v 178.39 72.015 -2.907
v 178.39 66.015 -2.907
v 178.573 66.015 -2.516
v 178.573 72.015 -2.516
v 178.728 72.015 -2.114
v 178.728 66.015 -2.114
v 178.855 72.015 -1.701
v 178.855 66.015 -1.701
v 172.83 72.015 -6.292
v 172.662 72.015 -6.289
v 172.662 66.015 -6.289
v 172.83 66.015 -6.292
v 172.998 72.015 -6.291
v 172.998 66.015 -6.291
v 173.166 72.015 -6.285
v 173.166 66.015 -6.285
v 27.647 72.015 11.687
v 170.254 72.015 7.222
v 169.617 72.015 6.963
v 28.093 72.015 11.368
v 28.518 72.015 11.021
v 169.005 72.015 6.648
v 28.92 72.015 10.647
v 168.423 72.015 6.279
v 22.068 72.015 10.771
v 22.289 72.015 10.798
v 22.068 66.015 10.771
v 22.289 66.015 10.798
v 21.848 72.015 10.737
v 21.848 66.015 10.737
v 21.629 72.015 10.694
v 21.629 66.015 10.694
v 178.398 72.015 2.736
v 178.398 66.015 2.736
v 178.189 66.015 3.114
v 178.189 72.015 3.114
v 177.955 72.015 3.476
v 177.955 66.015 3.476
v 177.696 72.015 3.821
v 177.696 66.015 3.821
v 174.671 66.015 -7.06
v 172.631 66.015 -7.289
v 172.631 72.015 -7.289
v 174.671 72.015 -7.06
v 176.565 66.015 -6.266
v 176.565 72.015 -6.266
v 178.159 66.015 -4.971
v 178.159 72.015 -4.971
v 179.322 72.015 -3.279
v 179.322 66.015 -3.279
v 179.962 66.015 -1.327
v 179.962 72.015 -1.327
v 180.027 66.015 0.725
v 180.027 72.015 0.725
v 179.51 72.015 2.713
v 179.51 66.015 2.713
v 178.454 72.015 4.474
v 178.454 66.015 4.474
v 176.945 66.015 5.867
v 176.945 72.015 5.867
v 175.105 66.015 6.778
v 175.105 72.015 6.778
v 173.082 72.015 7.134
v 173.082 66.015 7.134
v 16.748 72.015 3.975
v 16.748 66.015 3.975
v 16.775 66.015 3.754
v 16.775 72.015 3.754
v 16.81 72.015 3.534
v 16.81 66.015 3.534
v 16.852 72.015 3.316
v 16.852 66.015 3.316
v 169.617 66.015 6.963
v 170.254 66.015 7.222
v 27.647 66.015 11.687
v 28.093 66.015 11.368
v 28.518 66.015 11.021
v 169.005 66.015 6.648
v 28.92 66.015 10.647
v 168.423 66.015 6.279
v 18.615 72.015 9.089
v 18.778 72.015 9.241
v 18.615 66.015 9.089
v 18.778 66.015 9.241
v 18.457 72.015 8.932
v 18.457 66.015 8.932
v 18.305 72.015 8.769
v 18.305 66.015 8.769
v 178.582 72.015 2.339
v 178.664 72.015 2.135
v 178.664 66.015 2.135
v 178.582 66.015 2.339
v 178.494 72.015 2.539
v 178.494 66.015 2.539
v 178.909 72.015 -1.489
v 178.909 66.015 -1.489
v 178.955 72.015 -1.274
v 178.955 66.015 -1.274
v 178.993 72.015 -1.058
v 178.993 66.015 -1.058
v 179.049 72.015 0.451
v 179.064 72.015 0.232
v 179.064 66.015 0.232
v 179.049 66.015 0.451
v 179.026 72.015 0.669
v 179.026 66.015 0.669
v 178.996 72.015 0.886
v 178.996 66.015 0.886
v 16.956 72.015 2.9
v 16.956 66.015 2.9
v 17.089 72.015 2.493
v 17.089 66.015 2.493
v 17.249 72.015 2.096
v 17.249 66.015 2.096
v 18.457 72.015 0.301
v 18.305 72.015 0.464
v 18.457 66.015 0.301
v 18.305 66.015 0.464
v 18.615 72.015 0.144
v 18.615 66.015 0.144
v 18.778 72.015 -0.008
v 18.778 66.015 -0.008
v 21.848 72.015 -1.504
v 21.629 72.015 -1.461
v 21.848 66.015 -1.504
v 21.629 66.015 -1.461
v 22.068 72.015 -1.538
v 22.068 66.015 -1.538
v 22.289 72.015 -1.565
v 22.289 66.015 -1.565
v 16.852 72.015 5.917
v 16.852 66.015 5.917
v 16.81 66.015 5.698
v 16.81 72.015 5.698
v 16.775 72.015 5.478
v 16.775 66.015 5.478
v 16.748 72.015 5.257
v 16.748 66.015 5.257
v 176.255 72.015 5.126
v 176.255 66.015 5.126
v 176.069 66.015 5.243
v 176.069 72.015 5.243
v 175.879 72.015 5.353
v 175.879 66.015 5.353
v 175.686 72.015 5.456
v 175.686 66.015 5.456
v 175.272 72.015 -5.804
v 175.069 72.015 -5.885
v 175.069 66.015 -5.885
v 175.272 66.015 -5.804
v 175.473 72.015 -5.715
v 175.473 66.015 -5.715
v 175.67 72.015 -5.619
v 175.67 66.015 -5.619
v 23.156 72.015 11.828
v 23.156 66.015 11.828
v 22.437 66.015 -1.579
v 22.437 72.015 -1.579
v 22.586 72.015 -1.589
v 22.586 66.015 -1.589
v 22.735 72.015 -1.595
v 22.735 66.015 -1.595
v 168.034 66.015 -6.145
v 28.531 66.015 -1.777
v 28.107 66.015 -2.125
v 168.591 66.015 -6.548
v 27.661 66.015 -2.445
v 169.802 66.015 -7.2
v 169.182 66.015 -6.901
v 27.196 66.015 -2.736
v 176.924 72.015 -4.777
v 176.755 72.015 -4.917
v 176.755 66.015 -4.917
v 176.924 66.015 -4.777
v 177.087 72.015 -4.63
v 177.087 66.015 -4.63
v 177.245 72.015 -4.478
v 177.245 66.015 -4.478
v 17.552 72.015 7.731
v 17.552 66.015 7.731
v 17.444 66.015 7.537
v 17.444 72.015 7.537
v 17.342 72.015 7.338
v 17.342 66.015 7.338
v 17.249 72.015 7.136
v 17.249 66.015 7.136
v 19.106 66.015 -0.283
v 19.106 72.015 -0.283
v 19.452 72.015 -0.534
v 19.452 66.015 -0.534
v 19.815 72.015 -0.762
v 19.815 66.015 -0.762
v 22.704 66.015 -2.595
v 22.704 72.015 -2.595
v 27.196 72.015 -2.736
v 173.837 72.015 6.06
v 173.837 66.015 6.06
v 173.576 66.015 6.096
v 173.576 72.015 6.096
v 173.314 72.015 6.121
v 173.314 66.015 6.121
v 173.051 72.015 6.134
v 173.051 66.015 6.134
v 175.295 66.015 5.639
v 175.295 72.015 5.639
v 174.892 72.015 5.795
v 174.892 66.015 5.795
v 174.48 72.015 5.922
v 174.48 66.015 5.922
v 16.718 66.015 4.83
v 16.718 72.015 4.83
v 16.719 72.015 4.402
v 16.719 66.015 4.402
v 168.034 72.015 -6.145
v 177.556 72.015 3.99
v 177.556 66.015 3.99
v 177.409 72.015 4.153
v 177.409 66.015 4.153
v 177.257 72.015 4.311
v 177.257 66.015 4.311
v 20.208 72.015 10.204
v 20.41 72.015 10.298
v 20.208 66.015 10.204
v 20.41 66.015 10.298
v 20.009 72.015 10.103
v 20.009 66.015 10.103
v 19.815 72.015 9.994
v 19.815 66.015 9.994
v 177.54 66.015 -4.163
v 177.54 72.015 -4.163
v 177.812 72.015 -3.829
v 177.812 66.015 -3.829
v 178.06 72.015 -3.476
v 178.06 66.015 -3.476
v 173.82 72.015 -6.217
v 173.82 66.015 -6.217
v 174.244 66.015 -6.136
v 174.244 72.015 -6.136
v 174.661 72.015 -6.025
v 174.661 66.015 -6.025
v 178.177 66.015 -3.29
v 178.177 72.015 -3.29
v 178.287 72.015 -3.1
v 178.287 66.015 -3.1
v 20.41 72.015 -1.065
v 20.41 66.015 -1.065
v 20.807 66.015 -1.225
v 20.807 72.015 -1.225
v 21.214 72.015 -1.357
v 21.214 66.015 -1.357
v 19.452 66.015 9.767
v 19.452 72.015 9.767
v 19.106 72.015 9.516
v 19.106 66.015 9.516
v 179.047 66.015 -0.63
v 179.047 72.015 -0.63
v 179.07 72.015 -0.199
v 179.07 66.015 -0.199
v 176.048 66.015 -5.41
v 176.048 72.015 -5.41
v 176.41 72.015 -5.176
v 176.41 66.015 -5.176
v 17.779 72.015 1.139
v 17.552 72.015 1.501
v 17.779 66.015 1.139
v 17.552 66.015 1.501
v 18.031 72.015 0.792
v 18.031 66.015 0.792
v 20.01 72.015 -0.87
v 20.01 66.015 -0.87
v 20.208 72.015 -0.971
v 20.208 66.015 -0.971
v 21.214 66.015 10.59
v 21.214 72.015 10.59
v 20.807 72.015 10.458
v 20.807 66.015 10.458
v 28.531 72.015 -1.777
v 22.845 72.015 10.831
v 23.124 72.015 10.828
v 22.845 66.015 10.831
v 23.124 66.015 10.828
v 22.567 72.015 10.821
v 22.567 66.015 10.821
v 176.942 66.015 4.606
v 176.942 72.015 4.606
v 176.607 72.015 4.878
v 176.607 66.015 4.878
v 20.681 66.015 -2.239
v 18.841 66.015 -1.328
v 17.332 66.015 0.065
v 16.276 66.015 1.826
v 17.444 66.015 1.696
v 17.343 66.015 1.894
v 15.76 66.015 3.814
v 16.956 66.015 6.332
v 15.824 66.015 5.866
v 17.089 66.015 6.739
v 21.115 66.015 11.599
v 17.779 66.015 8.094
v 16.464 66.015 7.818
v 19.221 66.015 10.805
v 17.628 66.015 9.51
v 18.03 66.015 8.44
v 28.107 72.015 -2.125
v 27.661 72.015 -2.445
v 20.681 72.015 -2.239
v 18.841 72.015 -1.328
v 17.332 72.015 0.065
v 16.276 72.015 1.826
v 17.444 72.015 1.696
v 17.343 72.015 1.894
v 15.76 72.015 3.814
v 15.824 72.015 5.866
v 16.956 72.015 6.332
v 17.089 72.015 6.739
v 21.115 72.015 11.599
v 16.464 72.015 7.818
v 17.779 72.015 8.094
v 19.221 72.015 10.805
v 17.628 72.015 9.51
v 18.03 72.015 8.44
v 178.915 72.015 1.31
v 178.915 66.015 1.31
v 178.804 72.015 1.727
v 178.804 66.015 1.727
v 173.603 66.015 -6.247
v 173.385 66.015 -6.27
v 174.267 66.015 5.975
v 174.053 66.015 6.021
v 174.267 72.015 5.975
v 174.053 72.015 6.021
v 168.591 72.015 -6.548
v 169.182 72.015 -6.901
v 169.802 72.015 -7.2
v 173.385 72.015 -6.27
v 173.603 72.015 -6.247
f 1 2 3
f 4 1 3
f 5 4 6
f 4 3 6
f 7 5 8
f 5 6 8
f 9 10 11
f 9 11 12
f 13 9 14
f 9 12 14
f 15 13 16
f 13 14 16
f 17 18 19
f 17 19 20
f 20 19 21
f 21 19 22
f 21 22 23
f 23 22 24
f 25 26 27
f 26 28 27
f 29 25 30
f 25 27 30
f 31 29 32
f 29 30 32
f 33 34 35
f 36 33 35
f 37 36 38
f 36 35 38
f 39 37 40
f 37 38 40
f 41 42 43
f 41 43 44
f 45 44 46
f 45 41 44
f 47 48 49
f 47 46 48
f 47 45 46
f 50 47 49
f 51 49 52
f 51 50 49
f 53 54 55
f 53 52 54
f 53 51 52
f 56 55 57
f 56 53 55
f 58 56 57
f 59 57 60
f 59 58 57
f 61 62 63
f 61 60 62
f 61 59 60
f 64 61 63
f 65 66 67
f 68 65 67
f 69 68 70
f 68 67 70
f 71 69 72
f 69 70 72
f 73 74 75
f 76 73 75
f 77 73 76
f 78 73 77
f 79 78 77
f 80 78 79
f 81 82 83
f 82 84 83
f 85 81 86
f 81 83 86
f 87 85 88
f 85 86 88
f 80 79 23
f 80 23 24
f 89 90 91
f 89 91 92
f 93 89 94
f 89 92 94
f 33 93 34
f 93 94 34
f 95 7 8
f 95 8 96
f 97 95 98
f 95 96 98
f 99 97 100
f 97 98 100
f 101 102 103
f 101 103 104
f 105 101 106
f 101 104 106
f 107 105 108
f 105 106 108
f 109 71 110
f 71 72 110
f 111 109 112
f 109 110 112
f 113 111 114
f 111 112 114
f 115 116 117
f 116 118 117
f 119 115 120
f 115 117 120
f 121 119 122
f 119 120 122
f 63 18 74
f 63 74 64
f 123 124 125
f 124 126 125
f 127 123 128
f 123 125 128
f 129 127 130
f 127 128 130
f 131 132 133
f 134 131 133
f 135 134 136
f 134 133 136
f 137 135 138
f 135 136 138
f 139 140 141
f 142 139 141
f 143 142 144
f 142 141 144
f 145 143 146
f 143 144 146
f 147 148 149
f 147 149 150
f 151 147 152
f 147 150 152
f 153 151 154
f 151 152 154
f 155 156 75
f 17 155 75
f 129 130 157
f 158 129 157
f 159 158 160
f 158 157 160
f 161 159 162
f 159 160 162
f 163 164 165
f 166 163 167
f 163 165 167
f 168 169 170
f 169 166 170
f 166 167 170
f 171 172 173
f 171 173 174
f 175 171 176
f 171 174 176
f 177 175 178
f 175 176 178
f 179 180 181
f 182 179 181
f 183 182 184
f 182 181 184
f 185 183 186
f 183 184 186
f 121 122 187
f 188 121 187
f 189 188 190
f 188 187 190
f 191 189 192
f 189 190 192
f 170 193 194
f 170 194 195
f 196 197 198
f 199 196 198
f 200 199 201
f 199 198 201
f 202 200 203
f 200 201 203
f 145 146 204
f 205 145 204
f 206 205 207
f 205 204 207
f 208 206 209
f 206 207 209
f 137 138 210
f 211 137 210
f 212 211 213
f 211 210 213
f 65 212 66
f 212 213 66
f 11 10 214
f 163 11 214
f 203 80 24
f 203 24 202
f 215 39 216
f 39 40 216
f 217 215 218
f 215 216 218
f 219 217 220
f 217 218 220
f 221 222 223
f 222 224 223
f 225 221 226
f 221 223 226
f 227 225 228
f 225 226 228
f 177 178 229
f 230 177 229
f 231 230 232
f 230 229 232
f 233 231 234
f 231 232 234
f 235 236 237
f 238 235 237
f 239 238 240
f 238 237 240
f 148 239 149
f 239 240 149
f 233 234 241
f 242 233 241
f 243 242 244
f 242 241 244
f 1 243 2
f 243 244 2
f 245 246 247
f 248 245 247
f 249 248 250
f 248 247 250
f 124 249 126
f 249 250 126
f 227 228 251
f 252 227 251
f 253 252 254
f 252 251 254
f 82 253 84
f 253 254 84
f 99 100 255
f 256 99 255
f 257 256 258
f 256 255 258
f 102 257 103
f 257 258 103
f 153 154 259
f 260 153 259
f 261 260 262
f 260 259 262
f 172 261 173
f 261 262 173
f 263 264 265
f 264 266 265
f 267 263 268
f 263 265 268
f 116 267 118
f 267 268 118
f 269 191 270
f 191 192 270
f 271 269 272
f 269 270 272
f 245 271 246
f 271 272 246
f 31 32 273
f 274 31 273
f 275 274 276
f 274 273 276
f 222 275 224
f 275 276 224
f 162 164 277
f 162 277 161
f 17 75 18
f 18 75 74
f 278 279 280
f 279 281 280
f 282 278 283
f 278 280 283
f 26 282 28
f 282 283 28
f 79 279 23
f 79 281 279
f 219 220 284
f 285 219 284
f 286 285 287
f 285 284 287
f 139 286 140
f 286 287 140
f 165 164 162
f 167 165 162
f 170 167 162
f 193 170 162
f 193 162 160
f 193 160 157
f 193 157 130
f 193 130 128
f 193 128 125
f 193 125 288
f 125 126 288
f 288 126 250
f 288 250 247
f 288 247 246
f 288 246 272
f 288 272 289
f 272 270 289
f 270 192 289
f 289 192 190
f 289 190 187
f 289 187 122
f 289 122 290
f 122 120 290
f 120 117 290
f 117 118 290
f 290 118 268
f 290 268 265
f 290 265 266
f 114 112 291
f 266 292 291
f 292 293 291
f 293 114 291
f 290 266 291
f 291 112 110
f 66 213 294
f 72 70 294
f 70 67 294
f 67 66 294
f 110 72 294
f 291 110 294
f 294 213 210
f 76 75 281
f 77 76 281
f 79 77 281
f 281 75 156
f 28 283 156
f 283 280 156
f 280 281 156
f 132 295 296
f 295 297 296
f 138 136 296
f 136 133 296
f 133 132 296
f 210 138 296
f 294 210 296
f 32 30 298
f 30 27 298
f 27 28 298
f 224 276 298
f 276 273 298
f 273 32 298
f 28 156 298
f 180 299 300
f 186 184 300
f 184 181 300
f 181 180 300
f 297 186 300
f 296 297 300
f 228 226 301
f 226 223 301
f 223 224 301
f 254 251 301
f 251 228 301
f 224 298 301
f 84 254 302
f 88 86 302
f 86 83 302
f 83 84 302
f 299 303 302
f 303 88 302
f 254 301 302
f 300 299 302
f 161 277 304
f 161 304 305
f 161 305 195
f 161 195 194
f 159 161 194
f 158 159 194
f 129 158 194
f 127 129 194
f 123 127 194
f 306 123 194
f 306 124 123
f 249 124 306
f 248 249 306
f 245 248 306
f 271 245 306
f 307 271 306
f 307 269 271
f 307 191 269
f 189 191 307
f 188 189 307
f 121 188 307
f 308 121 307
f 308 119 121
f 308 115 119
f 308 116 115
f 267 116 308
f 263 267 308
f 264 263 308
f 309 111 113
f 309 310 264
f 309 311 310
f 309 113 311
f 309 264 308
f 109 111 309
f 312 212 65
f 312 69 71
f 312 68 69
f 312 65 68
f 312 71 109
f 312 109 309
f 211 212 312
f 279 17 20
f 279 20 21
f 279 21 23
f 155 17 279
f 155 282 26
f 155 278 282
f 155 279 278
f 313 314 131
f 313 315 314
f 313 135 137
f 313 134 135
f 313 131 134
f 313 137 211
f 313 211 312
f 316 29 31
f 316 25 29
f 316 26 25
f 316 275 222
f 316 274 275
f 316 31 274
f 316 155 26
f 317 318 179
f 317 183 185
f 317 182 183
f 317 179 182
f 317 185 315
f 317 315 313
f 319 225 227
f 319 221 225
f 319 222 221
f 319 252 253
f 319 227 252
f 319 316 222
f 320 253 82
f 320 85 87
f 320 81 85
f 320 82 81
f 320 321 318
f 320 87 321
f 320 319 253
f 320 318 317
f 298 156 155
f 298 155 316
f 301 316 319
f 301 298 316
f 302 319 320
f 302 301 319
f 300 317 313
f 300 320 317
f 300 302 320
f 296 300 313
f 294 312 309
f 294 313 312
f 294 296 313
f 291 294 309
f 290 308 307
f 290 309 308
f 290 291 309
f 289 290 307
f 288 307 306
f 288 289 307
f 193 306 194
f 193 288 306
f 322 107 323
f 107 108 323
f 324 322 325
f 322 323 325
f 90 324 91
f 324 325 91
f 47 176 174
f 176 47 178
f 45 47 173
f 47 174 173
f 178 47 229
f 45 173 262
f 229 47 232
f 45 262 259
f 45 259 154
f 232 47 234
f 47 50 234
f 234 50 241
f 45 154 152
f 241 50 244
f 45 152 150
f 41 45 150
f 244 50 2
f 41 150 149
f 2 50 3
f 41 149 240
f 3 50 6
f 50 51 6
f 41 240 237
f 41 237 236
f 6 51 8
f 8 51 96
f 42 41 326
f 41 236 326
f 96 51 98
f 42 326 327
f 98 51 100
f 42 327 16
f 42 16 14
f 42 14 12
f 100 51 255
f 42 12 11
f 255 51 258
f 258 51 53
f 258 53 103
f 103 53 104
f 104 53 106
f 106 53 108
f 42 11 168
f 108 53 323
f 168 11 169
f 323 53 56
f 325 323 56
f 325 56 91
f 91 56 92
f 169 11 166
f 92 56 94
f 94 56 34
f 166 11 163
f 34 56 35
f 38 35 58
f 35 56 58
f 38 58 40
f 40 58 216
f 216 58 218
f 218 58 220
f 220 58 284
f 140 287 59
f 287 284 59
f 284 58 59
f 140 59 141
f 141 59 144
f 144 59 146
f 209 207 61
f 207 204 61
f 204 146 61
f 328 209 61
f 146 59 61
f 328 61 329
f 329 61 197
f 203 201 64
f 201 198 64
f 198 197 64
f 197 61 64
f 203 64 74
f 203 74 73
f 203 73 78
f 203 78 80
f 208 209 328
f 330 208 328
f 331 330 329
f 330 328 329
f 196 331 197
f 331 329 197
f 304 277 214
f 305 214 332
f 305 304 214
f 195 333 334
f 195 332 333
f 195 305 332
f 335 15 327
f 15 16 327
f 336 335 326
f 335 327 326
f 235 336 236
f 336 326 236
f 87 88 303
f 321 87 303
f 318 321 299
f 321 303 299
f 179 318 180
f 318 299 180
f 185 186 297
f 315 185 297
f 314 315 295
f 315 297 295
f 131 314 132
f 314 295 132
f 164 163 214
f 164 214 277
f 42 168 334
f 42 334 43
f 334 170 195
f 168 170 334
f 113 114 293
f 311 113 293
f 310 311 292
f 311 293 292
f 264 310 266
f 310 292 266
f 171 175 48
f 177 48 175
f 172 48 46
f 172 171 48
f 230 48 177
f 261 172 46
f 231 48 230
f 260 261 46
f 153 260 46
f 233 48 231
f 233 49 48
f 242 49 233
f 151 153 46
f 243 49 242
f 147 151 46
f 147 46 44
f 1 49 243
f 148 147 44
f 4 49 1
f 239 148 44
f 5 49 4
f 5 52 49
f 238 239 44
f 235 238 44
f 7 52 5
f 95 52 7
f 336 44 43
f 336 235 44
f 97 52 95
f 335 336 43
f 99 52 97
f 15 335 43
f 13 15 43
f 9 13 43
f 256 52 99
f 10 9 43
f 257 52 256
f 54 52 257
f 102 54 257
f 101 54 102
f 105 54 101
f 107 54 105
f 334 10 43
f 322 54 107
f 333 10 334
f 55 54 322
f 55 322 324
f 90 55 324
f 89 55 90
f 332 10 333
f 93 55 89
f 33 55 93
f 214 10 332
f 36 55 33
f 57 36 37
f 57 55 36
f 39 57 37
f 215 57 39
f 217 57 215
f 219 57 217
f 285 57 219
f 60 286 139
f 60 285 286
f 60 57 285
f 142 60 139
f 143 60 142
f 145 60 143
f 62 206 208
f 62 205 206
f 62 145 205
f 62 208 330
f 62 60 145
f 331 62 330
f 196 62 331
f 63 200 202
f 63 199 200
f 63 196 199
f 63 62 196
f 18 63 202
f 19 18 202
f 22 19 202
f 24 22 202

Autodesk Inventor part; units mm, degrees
ref_plane "YZ Plane" through (0, 0, 0) normal (1, 0, 0) x (0, 1, 0)
ref_plane "XZ Plane" through (0, 0, 0) normal (0, 1, 0) x (-1, 0, 0)
ref_plane "Work Plane1" through (99.0561, 66.015, -1.0424) normal (0, 1, 0) x (-0.9985, 0, 0.0543)
sketch "Sketch1" plane through (99.0561, 66.015, -1.0424) normal (0, 1, 0) x (-0.9985, 0, 0.0543)
  circle A0 centre (-73.639, 4.9709) radius 7.75 projected
  arc A1 (-74.285, 11.1523) -> (-74.9346, 11.0494) centre (-73.639, 4.9709) ccw projected
  line L0 (-74.039, 10.5582) -> (-74.285, 11.1523) projected
  line L1 (-73.239, 10.5582) -> (-74.039, 10.5582) projected
  line L2 (-72.9929, 11.1523) -> (-73.239, 10.5582) projected
  arc A2 (-72.3433, 11.0494) -> (-72.9929, 11.1523) centre (-73.639, 4.9709) ccw projected
  line L3 (-72.2928, 10.4083) -> (-72.3433, 11.0494) projected
  line L4 (-71.532, 10.1611) -> (-72.2928, 10.4083) projected
  line L5 (-71.1144, 10.6501) -> (-71.532, 10.1611) projected
  arc A3 (-70.5284, 10.3515) -> (-71.1144, 10.6501) centre (-73.639, 4.9709) ccw projected
  line L6 (-70.6785, 9.7262) -> (-70.5284, 10.3515) projected
  line L7 (-70.0313, 9.256) -> (-70.6785, 9.7262) projected
  line L8 (-69.483, 9.592) -> (-70.0313, 9.256) projected
  arc A4 (-69.0179, 9.1269) -> (-69.483, 9.592) centre (-73.639, 4.9709) ccw projected
  line L9 (-69.3539, 8.5786) -> (-69.0179, 9.1269) projected
  line L10 (-68.8837, 7.9314) -> (-69.3539, 8.5786) projected
  line L11 (-68.2584, 8.0815) -> (-68.8837, 7.9314) projected
  arc A5 (-67.9598, 7.4955) -> (-68.2584, 8.0815) centre (-73.639, 4.9709) ccw projected
  line L12 (-68.4488, 7.0779) -> (-67.9598, 7.4955) projected
  line L13 (-68.2016, 6.3171) -> (-68.4488, 7.0779) projected
  line L14 (-67.5605, 6.2666) -> (-68.2016, 6.3171) projected
  arc A6 (-67.4576, 5.617) -> (-67.5605, 6.2666) centre (-73.639, 4.9709) ccw projected
  line L15 (-68.0517, 5.3709) -> (-67.4576, 5.617) projected
  line L16 (-68.0517, 4.5709) -> (-68.0517, 5.3709) projected
  line L17 (-67.4576, 4.3249) -> (-68.0517, 4.5709) projected
  arc A7 (-67.5605, 3.6753) -> (-67.4576, 4.3249) centre (-73.639, 4.9709) ccw projected
  line L18 (-68.2016, 3.6248) -> (-67.5605, 3.6753) projected
  line L19 (-68.4488, 2.864) -> (-68.2016, 3.6248) projected
  line L20 (-67.9598, 2.4463) -> (-68.4488, 2.864) projected
  arc A8 (-68.2584, 1.8603) -> (-67.9598, 2.4463) centre (-73.639, 4.9709) ccw projected
  line L21 (-68.8837, 2.0105) -> (-68.2584, 1.8603) projected
  line L22 (-69.3539, 1.3632) -> (-68.8837, 2.0105) projected
  line L23 (-69.0179, 0.815) -> (-69.3539, 1.3632) projected
  arc A9 (-69.483, 0.3499) -> (-69.0179, 0.815) centre (-73.639, 4.9709) ccw projected
  line L24 (-70.0313, 0.6859) -> (-69.483, 0.3499) projected
  line L25 (-70.6785, 0.2157) -> (-70.0313, 0.6859) projected
  line L26 (-70.5284, -0.4096) -> (-70.6785, 0.2157) projected
  arc A10 (-71.1144, -0.7082) -> (-70.5284, -0.4096) centre (-73.639, 4.9709) ccw projected
  line L27 (-71.532, -0.2192) -> (-71.1144, -0.7082) projected
  line L28 (-72.2928, -0.4664) -> (-71.532, -0.2192) projected
  line L29 (-72.3433, -1.1075) -> (-72.2928, -0.4664) projected
  arc A11 (-72.9929, -1.2104) -> (-72.3433, -1.1075) centre (-73.639, 4.9709) ccw projected
  line L30 (-73.239, -0.6163) -> (-72.9929, -1.2104) projected
  line L31 (-74.039, -0.6163) -> (-73.239, -0.6163) projected
  line L32 (-74.285, -1.2104) -> (-74.039, -0.6163) projected
  arc A12 (-74.9346, -1.1075) -> (-74.285, -1.2104) centre (-73.639, 4.9709) ccw projected
  line L33 (-74.9851, -0.4664) -> (-74.9346, -1.1075) projected
  line L34 (-75.7459, -0.2192) -> (-74.9851, -0.4664) projected
  line L35 (-76.1636, -0.7082) -> (-75.7459, -0.2192) projected
  arc A13 (-76.7496, -0.4096) -> (-76.1636, -0.7082) centre (-73.639, 4.9709) ccw projected
  line L36 (-76.5994, 0.2157) -> (-76.7496, -0.4096) projected
  line L37 (-77.2467, 0.6859) -> (-76.5994, 0.2157) projected
  line L38 (-77.7949, 0.3499) -> (-77.2467, 0.6859) projected
  arc A14 (-78.26, 0.815) -> (-77.7949, 0.3499) centre (-73.639, 4.9709) ccw projected
  line L39 (-77.924, 1.3632) -> (-78.26, 0.815) projected
  line L40 (-78.3942, 2.0105) -> (-77.924, 1.3632) projected
  line L41 (-79.0195, 1.8603) -> (-78.3942, 2.0105) projected
  arc A15 (-79.3181, 2.4463) -> (-79.0195, 1.8603) centre (-73.639, 4.9709) ccw projected
  line L42 (-78.8291, 2.864) -> (-79.3181, 2.4463) projected
  line L43 (-79.0763, 3.6248) -> (-78.8291, 2.864) projected
  line L44 (-79.7174, 3.6753) -> (-79.0763, 3.6248) projected
  arc A16 (-79.8203, 4.3249) -> (-79.7174, 3.6753) centre (-73.639, 4.9709) ccw projected
  line L45 (-79.2262, 4.5709) -> (-79.8203, 4.3249) projected
  line L46 (-79.2262, 5.3709) -> (-79.2262, 4.5709) projected
  line L47 (-79.8203, 5.617) -> (-79.2262, 5.3709) projected
  arc A17 (-79.7174, 6.2666) -> (-79.8203, 5.617) centre (-73.639, 4.9709) ccw projected
  line L48 (-79.0763, 6.3171) -> (-79.7174, 6.2666) projected
  line L49 (-78.8291, 7.0779) -> (-79.0763, 6.3171) projected
  line L50 (-79.3181, 7.4955) -> (-78.8291, 7.0779) projected
  arc A18 (-79.0195, 8.0815) -> (-79.3181, 7.4955) centre (-73.639, 4.9709) ccw projected
  line L51 (-78.3942, 7.9314) -> (-79.0195, 8.0815) projected
  line L52 (-77.924, 8.5786) -> (-78.3942, 7.9314) projected
  line L53 (-78.26, 9.1269) -> (-77.924, 8.5786) projected
  arc A19 (-77.7949, 9.592) -> (-78.26, 9.1269) centre (-73.639, 4.9709) ccw projected
  line L54 (-77.2467, 9.256) -> (-77.7949, 9.592) projected
  line L55 (-76.5994, 9.7262) -> (-77.2467, 9.256) projected
  line L56 (-76.7496, 10.3515) -> (-76.5994, 9.7262) projected
  arc A20 (-76.1636, 10.6501) -> (-76.7496, 10.3515) centre (-73.639, 4.9709) ccw projected
  line L57 (-75.7459, 10.1611) -> (-76.1636, 10.6501) projected
  line L58 (-74.9851, 10.4083) -> (-75.7459, 10.1611) projected
  line L59 (-74.9346, 11.0494) -> (-74.9851, 10.4083) projected
  circle A21 centre (76.3213, 1.5167) radius 8.5 projected
  arc A22 (76.017, 7.7243) -> (75.3526, 7.6558) centre (76.3213, 1.5167) ccw projected
  line L60 (76.226, 7.1302) -> (76.017, 7.7243) projected
  line L61 (77.0249, 7.0867) -> (76.226, 7.1302) projected
  line L62 (77.2971, 7.6546) -> (77.0249, 7.0867) projected
  arc A23 (77.9501, 7.5145) -> (77.2971, 7.6546) centre (76.3213, 1.5167) ccw projected
  line L63 (77.9654, 6.8849) -> (77.9501, 7.5145) projected
  line L64 (78.7116, 6.5967) -> (77.9654, 6.8849) projected
  line L65 (79.1461, 7.0527) -> (78.7116, 6.5967) projected
  arc A24 (79.7238, 6.7176) -> (79.1461, 7.0527) centre (76.3213, 1.5167) ccw projected
  line L66 (79.5437, 6.1141) -> (79.7238, 6.7176) projected
  line L67 (80.1645, 5.6094) -> (79.5437, 6.1141) projected
  line L68 (80.7185, 5.9088) -> (80.1645, 5.6094) projected
  arc A25 (81.1644, 5.4116) -> (80.7185, 5.9088) centre (76.3213, 1.5167) ccw projected
  line L69 (80.8067, 4.8933) -> (81.1644, 5.4116) projected
  line L70 (81.2411, 4.2215) -> (80.8067, 4.8933) projected
  line L71 (81.8605, 4.335) -> (81.2411, 4.2215) projected
  arc A26 (82.131, 3.7243) -> (81.8605, 4.335) centre (76.3213, 1.5167) ccw projected
  line L72 (81.6306, 3.3419) -> (82.131, 3.7243) projected
  line L73 (81.8361, 2.5688) -> (81.6306, 3.3419) projected
  line L74 (82.4603, 2.4853) -> (81.8361, 2.5688) projected
  arc A27 (82.5288, 1.821) -> (82.4603, 2.4853) centre (76.3213, 1.5167) ccw projected
  line L75 (81.9347, 1.6119) -> (82.5288, 1.821) projected
  line L76 (81.8913, 0.8131) -> (81.9347, 1.6119) projected
  line L77 (82.4592, 0.5409) -> (81.8913, 0.8131) projected
  arc A28 (82.319, -0.1121) -> (82.4592, 0.5409) centre (76.3213, 1.5167) ccw projected
  line L78 (81.6894, -0.1274) -> (82.319, -0.1121) projected
  line L79 (81.4012, -0.8737) -> (81.6894, -0.1274) projected
  line L80 (81.8572, -1.3081) -> (81.4012, -0.8737) projected
  arc A29 (81.5221, -1.8858) -> (81.8572, -1.3081) centre (76.3213, 1.5167) ccw projected
  line L81 (80.9186, -1.7058) -> (81.5221, -1.8858) projected
  line L82 (80.4139, -2.3265) -> (80.9186, -1.7058) projected
  line L83 (80.7133, -2.8805) -> (80.4139, -2.3265) projected
  arc A30 (80.2161, -3.3264) -> (80.7133, -2.8805) centre (76.3213, 1.5167) ccw projected
  line L84 (79.6978, -2.9687) -> (80.2161, -3.3264) projected
  line L85 (79.026, -3.4031) -> (79.6978, -2.9687) projected
  line L86 (79.1395, -4.0225) -> (79.026, -3.4031) projected
  arc A31 (78.5289, -4.293) -> (79.1395, -4.0225) centre (76.3213, 1.5167) ccw projected
  line L87 (78.1465, -3.7926) -> (78.5289, -4.293) projected
  line L88 (77.3733, -3.9981) -> (78.1465, -3.7926) projected
  line L89 (77.2899, -4.6223) -> (77.3733, -3.9981) projected
  arc A32 (76.6255, -4.6908) -> (77.2899, -4.6223) centre (76.3213, 1.5167) ccw projected
  line L90 (76.4165, -4.0967) -> (76.6255, -4.6908) projected
  line L91 (75.6177, -4.0533) -> (76.4165, -4.0967) projected
  line L92 (75.3454, -4.6212) -> (75.6177, -4.0533) projected
  arc A33 (74.6924, -4.481) -> (75.3454, -4.6212) centre (76.3213, 1.5167) ccw projected
  line L93 (74.6772, -3.8514) -> (74.6924, -4.481) projected
  line L94 (73.9309, -3.5632) -> (74.6772, -3.8514) projected
  line L95 (73.4964, -4.0192) -> (73.9309, -3.5632) projected
  arc A34 (72.9187, -3.6841) -> (73.4964, -4.0192) centre (76.3213, 1.5167) ccw projected
  line L96 (73.0988, -3.0806) -> (72.9187, -3.6841) projected
  line L97 (72.4781, -2.5759) -> (73.0988, -3.0806) projected
  line L98 (71.924, -2.8754) -> (72.4781, -2.5759) projected
  arc A35 (71.4781, -2.3781) -> (71.924, -2.8754) centre (76.3213, 1.5167) ccw projected
  line L99 (71.8358, -1.8598) -> (71.4781, -2.3781) projected
  line L100 (71.4015, -1.188) -> (71.8358, -1.8598) projected
  line L101 (70.782, -1.3016) -> (71.4015, -1.188) projected
  arc A36 (70.5116, -0.6909) -> (70.782, -1.3016) centre (76.3213, 1.5167) ccw projected
  line L102 (71.012, -0.3085) -> (70.5116, -0.6909) projected
  line L103 (70.8064, 0.4647) -> (71.012, -0.3085) projected
  line L104 (70.1822, 0.5481) -> (70.8064, 0.4647) projected
  arc A37 (70.1137, 1.2125) -> (70.1822, 0.5481) centre (76.3213, 1.5167) ccw projected
  line L105 (70.7078, 1.4215) -> (70.1137, 1.2125) projected
  line L106 (70.7513, 2.2203) -> (70.7078, 1.4215) projected
  line L107 (70.1834, 2.4926) -> (70.7513, 2.2203) projected
  arc A38 (70.3235, 3.1456) -> (70.1834, 2.4926) centre (76.3213, 1.5167) ccw projected
  line L108 (70.9531, 3.1608) -> (70.3235, 3.1456) projected
  line L109 (71.2413, 3.9071) -> (70.9531, 3.1608) projected
  line L110 (70.7853, 4.3415) -> (71.2413, 3.9071) projected
  arc A39 (71.1204, 4.9193) -> (70.7853, 4.3415) centre (76.3213, 1.5167) ccw projected
  line L111 (71.7239, 4.7392) -> (71.1204, 4.9193) projected
  line L112 (72.2286, 5.3599) -> (71.7239, 4.7392) projected
  line L113 (71.9292, 5.914) -> (72.2286, 5.3599) projected
  arc A40 (72.4264, 6.3599) -> (71.9292, 5.914) centre (76.3213, 1.5167) ccw projected
  line L114 (72.9447, 6.0021) -> (72.4264, 6.3599) projected
  line L115 (73.6165, 6.4365) -> (72.9447, 6.0021) projected
  line L116 (73.503, 7.056) -> (73.6165, 6.4365) projected
  arc A41 (74.1136, 7.3264) -> (73.503, 7.056) centre (76.3213, 1.5167) ccw projected
  line L117 (74.496, 6.826) -> (74.1136, 7.3264) projected
  line L118 (75.2692, 7.0315) -> (74.496, 6.826) projected
  line L119 (75.3526, 7.6558) -> (75.2692, 7.0315) projected
  line L120 (76.1551, -5.6964) -> (-73.8051, -2.2421)
  line L121 (76.4874, 8.7298) -> (-73.4728, 12.184)
  arc A42 (76.1551, -5.6964) -> (76.4874, 8.7298) centre (76.3213, 1.5167) ccw
  arc A43 (-73.4958, 11.1843) -> (-73.7821, -1.2424) centre (-73.639, 4.9709) ccw
  arc A44 (-73.4728, 12.184) -> (-73.8051, -2.2421) centre (-73.639, 4.9709) ccw
  line L122 (-73.7821, -1.2424) -> (76.1781, -4.6966)
  arc A45 (76.1781, -4.6966) -> (76.017, 7.7243) centre (76.3213, 1.5167) ccw
  line L123 (76.4644, 7.7301) -> (-73.4958, 11.1843)
  point P0 (98.9665, -4.3398)
  dimension "d1" = 1
  dimension "d2" = 1
extrude "Extrusion1" add sketch "Sketch1" along normal blind 6 contours L123 A43 A1 A20 A19 A18 A17 A16 A15 A14 A13 A12 L122 A0 L120 A44 L121 | A0 L121 A21 L123 | L122 A21 L120 A0 | A21 L121 A42 L120 L122 A45 A32 A31 A30 A29 A28 A27 A26 A25 A24 A23 L123
properties part number "Tandrem"
